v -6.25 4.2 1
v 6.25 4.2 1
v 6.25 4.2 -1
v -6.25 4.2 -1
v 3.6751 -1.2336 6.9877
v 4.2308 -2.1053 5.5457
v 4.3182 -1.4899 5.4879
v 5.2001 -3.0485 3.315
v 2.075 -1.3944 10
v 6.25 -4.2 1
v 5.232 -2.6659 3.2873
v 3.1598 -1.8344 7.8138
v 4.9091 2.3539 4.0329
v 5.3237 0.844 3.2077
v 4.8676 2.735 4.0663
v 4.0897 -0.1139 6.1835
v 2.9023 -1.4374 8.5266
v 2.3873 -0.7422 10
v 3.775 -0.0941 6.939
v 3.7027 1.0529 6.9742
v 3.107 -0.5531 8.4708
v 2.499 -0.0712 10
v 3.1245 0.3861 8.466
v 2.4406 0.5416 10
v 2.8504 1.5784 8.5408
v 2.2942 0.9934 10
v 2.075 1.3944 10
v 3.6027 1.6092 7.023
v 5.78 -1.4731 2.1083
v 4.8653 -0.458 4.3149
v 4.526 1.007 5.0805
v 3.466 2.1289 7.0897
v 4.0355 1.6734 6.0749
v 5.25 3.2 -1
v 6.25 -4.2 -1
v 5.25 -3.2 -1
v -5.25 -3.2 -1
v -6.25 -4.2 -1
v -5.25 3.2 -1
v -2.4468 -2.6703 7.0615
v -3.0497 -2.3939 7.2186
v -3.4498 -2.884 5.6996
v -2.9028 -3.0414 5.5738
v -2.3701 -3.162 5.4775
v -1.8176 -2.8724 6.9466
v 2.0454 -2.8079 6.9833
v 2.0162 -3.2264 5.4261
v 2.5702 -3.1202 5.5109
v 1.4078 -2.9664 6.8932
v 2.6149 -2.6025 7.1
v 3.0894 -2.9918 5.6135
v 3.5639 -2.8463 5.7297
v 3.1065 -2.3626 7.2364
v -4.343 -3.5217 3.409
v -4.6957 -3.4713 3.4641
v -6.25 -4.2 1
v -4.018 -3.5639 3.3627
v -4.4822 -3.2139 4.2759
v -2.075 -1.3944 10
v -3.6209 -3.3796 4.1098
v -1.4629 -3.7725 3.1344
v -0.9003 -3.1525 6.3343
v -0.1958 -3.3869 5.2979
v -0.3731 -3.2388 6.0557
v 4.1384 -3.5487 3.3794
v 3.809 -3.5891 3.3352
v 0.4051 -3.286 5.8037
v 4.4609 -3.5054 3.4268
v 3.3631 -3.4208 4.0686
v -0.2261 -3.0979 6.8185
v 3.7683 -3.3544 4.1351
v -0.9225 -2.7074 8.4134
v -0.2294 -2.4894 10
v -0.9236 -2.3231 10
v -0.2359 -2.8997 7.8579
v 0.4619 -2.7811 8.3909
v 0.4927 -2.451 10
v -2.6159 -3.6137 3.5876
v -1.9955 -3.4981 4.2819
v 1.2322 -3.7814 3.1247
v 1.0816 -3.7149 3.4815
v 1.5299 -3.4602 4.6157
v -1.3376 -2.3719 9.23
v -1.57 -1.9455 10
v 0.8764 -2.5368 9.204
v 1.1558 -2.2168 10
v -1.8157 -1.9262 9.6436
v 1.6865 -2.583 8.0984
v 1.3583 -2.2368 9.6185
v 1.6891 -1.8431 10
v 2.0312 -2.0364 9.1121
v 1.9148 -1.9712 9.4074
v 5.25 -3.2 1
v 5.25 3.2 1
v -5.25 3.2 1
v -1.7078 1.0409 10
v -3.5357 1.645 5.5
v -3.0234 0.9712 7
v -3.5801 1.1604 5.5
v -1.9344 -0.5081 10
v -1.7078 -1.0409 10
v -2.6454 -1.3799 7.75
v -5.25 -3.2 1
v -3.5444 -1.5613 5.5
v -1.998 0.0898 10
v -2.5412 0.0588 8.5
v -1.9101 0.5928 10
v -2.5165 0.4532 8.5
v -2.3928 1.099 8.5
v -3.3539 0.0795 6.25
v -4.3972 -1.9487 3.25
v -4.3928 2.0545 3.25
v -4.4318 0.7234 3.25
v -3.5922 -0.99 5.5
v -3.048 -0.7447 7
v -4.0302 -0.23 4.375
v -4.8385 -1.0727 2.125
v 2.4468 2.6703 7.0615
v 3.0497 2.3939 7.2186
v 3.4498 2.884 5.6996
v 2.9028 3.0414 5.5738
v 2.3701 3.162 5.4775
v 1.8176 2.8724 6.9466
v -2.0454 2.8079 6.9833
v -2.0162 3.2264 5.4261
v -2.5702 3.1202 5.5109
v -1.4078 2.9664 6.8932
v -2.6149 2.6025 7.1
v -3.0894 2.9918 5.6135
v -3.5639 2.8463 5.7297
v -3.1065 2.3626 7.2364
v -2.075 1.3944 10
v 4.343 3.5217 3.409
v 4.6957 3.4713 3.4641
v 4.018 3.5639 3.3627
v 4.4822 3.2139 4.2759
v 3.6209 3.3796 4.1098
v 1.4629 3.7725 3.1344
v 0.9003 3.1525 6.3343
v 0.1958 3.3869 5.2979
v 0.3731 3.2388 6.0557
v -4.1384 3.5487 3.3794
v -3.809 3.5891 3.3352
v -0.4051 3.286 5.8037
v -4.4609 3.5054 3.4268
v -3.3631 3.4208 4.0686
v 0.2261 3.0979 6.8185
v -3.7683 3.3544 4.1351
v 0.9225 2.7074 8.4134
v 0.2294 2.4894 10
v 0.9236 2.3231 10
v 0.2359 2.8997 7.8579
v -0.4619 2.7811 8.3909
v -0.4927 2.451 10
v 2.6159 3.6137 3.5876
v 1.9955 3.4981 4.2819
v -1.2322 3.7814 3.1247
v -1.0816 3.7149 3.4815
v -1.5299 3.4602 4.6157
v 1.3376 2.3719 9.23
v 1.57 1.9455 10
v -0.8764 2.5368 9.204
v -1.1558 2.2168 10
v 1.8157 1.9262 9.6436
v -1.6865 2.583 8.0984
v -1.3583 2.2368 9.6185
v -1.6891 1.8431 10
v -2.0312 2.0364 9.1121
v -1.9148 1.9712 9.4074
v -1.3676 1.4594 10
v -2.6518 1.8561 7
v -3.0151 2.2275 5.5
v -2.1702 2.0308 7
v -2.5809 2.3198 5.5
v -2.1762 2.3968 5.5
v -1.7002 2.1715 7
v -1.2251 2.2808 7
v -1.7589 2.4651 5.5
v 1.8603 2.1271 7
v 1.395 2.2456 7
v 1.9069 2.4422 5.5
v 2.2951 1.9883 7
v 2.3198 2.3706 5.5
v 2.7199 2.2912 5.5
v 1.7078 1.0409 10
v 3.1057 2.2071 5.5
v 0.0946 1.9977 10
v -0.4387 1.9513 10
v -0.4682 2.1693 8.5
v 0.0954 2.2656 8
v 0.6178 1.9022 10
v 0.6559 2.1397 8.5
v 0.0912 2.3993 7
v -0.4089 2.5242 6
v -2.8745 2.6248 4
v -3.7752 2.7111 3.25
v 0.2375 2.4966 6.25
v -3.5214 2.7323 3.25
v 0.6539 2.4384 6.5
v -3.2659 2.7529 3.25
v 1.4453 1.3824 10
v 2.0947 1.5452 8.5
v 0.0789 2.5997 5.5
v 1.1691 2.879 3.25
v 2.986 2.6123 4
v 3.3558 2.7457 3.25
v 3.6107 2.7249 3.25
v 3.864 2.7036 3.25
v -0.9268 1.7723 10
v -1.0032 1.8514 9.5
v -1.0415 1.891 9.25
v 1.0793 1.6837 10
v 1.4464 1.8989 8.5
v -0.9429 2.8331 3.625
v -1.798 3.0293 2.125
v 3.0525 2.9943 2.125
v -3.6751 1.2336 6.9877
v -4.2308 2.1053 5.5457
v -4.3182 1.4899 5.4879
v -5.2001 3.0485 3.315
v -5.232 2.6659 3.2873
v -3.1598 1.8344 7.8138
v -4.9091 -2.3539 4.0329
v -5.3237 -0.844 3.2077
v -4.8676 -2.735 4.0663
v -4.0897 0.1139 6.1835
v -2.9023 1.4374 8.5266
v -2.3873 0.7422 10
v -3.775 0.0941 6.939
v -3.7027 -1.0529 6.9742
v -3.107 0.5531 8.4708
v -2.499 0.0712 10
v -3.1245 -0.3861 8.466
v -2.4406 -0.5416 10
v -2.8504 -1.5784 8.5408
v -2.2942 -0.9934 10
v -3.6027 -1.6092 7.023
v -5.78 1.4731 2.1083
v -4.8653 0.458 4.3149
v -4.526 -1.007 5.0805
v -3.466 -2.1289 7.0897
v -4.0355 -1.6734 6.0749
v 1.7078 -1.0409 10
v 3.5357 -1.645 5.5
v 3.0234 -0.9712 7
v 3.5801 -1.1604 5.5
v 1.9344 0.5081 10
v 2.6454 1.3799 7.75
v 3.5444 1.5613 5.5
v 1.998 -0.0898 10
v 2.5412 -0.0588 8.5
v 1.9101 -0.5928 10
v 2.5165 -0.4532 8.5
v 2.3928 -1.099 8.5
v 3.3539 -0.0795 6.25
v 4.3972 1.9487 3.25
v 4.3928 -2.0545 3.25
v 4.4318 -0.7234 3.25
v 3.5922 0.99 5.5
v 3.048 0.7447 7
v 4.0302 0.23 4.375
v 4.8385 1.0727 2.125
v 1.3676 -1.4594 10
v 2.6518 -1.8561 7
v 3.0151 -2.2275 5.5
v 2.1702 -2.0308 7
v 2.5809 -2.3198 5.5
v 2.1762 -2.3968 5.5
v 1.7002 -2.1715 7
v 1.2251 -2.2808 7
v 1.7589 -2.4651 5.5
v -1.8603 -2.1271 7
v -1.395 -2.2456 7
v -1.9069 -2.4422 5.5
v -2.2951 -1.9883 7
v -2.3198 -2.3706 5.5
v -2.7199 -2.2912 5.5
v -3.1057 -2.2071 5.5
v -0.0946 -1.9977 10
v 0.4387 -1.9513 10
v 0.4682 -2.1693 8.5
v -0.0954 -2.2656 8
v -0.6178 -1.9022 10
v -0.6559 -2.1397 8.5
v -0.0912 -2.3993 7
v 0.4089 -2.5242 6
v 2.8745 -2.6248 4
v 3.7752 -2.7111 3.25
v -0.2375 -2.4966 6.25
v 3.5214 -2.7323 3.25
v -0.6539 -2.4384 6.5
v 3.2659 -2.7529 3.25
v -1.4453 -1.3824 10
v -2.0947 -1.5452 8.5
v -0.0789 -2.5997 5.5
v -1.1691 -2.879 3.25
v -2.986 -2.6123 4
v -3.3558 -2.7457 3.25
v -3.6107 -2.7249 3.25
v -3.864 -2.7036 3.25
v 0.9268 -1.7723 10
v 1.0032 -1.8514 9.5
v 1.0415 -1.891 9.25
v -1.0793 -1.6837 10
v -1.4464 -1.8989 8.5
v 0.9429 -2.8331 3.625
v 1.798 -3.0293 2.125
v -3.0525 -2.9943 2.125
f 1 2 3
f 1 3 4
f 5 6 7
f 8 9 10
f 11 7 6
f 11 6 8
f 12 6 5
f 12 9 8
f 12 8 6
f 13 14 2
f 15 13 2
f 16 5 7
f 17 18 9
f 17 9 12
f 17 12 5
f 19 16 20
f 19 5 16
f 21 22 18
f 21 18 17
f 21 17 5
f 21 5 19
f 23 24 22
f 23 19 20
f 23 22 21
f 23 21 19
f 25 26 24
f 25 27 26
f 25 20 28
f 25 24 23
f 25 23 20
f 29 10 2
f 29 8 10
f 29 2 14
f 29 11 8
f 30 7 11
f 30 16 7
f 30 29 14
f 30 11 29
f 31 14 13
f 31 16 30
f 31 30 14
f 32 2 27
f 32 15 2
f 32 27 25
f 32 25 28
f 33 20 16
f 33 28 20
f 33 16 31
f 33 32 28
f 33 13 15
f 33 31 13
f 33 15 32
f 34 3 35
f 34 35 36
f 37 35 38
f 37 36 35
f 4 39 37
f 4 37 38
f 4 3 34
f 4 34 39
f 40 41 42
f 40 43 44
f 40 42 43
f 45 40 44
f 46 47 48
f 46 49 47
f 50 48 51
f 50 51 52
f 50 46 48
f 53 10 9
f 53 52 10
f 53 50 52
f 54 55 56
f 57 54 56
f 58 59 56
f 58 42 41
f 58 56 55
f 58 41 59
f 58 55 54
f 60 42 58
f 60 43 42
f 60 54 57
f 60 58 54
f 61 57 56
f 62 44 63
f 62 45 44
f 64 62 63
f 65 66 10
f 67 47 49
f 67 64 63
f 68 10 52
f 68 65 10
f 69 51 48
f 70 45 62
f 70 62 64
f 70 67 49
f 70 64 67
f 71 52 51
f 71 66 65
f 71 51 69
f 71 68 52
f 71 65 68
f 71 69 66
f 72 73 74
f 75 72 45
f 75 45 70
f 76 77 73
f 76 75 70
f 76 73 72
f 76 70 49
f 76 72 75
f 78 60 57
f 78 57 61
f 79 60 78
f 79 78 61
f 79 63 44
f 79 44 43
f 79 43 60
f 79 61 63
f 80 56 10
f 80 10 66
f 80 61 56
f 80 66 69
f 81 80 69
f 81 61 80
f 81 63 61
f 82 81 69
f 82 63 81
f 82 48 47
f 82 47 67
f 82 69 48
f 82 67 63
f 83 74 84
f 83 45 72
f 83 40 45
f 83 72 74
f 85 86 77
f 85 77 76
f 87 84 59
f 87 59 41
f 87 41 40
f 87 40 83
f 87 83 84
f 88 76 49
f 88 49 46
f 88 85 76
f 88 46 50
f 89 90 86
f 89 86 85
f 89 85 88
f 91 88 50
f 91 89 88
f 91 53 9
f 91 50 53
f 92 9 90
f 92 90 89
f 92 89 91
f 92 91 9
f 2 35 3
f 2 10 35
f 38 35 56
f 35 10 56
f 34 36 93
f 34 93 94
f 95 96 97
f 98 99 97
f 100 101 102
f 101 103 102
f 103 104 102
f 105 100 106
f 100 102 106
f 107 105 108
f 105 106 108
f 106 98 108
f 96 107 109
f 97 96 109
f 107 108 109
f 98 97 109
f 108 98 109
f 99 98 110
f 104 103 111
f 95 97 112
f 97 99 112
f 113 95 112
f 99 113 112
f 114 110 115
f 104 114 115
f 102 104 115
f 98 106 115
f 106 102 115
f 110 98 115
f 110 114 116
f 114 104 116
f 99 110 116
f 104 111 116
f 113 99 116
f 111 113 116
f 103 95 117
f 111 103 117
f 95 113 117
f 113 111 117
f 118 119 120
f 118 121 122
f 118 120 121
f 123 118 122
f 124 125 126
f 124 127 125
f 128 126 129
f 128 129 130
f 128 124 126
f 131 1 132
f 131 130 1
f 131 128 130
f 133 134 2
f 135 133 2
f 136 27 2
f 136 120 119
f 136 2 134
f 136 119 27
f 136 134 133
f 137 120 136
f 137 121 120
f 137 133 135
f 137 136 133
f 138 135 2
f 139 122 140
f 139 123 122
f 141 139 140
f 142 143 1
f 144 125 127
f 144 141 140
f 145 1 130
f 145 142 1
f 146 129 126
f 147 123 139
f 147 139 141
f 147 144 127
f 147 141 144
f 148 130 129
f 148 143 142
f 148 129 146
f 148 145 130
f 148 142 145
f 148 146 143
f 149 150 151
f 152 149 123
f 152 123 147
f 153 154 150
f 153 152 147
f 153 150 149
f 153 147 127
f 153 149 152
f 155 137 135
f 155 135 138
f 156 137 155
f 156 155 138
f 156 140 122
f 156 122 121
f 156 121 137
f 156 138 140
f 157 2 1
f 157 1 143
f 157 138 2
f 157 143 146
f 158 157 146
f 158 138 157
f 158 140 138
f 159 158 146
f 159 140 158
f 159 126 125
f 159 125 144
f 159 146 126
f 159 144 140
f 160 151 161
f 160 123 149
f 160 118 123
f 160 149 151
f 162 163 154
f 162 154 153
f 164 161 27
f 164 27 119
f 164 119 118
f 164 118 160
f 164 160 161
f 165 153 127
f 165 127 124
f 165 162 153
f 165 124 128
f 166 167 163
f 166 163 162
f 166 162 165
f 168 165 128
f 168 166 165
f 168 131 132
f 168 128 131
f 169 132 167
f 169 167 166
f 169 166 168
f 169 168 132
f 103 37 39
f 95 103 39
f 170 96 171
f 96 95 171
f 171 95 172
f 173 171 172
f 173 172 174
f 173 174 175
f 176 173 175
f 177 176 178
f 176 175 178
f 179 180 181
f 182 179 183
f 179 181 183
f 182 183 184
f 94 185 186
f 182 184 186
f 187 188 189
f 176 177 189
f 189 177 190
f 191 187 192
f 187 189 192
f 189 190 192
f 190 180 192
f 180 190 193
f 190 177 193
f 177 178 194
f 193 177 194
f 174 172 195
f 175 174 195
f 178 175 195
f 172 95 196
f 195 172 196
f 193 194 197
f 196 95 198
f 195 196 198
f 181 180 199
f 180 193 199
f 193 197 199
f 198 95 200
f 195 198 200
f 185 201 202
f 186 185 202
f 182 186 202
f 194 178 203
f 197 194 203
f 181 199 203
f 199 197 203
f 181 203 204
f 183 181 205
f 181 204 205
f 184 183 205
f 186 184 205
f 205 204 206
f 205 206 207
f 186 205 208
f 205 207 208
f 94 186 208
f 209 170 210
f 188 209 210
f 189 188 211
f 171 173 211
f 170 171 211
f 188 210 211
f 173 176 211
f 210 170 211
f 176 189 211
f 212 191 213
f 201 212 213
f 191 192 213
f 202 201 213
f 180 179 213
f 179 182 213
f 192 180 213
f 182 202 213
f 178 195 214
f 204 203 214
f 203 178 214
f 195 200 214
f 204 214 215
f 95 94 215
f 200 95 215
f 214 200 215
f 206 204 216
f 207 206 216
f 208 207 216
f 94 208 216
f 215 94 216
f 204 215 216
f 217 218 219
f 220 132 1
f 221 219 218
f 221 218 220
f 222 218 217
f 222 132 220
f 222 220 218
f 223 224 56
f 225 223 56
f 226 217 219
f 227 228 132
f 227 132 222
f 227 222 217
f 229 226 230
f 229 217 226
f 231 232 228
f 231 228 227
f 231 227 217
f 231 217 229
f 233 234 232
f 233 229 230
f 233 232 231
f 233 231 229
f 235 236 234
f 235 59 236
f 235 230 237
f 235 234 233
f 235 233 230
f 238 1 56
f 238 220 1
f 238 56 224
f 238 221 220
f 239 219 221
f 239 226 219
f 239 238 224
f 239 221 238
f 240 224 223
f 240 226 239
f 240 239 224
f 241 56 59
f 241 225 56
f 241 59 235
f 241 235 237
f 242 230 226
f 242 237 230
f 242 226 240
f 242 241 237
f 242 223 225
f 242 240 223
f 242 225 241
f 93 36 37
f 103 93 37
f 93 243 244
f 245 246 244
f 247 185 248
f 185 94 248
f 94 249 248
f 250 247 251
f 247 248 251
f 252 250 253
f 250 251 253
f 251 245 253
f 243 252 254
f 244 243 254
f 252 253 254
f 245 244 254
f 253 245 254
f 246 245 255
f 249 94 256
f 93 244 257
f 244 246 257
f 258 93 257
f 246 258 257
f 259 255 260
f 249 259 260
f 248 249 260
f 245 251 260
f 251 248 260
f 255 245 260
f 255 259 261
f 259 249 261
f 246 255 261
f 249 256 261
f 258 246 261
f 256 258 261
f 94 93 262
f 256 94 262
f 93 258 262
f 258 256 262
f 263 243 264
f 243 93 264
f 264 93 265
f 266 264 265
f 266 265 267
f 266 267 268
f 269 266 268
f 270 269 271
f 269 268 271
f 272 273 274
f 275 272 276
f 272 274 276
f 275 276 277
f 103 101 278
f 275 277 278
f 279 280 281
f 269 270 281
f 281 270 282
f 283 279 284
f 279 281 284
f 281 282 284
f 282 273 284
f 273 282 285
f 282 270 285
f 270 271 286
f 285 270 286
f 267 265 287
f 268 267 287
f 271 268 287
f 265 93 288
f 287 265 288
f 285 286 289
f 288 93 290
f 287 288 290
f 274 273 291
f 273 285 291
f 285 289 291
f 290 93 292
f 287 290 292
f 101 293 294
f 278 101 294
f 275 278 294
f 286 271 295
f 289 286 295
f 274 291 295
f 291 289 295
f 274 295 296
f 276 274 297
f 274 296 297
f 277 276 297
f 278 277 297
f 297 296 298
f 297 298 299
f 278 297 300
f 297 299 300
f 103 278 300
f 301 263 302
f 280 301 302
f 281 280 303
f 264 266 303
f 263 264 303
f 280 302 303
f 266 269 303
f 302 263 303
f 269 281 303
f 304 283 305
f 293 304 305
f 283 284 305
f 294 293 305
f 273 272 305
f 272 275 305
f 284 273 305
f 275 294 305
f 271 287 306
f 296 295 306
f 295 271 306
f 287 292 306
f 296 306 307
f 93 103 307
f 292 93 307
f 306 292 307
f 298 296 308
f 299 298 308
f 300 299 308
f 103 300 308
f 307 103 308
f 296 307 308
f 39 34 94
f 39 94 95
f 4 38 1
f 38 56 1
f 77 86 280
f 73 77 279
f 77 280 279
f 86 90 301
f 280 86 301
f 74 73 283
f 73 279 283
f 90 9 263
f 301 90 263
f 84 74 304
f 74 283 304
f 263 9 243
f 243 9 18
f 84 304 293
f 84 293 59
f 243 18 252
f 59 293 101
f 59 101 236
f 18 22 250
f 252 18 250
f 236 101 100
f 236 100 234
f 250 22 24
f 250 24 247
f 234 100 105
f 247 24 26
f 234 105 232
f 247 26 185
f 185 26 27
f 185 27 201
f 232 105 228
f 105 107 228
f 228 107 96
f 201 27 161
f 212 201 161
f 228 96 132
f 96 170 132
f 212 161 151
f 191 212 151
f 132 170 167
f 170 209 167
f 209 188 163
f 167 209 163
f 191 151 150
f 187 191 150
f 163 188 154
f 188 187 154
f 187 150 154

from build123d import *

# Parameters (mm, degrees)
SKETCH1_W           = 12.5
SKETCH1_H           = 8.4
SKETCH1_W_2         = 10.5
SKETCH1_H_2         = 6.4
BOSS_EXTRUDE1_DEPTH = 1
SKETCH6_W           = 12.5
SKETCH6_H           = 8.4
BOSS_EXTRUDE2_DEPTH = 1
SKETCH7_W           = 10.5
SKETCH7_H           = 6.4
CUT_EXTRUDE1_DEPTH  = 1


with BuildPart() as part:
    # Sketch1 → Boss-Extrude1 (new body)
    with BuildSketch(Plane.XY):
        Rectangle(SKETCH1_W, SKETCH1_H)
        Rectangle(SKETCH1_W_2, SKETCH1_H_2, mode=Mode.SUBTRACT)
    extrude(amount=BOSS_EXTRUDE1_DEPTH)

    # Sketch3 → Loft1 section 0
    with BuildSketch(Plane.XY.offset(1)):
        with BuildLine():
            Line((6.25, -4.2), (6.25, 4.2))
            Line((6.25, 4.2), (-6.25, 4.2))
            Line((-6.25, 4.2), (-6.25, -4.2))
            Line((-6.25, -4.2), (6.25, -4.2))
        make_face()
    # Sketch2 for Loft1 → Loft1 section 1
    with BuildSketch(Plane.XY.offset(10)):
        with BuildLine():
            # circular arc as an exact rational Bezier (weights 1, cos(half-angle), 1)
            Bezier((2.075003924, -1.394402637), (3.012042497, 0), (2.075003924, 1.394402637), weights=[1, 0.830001569, 1])
            Bezier((2.075003924, 1.394402637), (0, 4.482206096), (-2.075003924, 1.394402637), weights=[1, 0.557761055, 1])
            Bezier((-2.075003924, 1.394402637), (-3.012042497, 0), (-2.075003924, -1.394402637), weights=[1, 0.830001569, 1])
            Bezier((-2.075003924, -1.394402637), (0, -4.482206096), (2.075003924, -1.394402637), weights=[1, 0.557761055, 1])
        make_face()
    loft()

    # Cut-Loft1: read off the stored shape, not the designer's step
    # Cut-Loft1: loft between two sections, ruled curve by curve
    cut_loft1_from = [
        Edge.make_bspline([(1.707768655, -1.040925656, 10), (1.633699479, -1.162445397, 10), (1.542008876, -1.28354475, 10), (1.31984949, -1.511051231, 10), (1.189256111, -1.617336715, 10), (0.892947872, -1.797985608, 10), (0.72722112, -1.87212471, 10), (0.374256765, -1.973229171, 10), (0.187198335, -2, 10), (-0.187198335, -2, 10), (-0.374256765, -1.973229171, 10), (-0.72722112, -1.87212471, 10), (-0.892947872, -1.797985608, 10), (-1.189256111, -1.617336715, 10), (-1.31984949, -1.511051231, 10), (-1.542008876, -1.28354475, 10), (-1.633699479, -1.162445397, 10), (-1.707768655, -1.040925656, 10)], [0, 0, 0, 0, 0.125, 0.125, 0.25, 0.25, 0.375, 0.375, 0.5, 0.5, 0.625, 0.625, 0.75, 0.75, 0.875, 0.875, 1, 1, 1, 1], 3),
        Edge.make_bspline([(-1.707768655, -1.040925656, 10), (-1.798062507, -0.892787306, 10), (-1.872174068, -0.727085204, 10), (-1.973239973, -0.374182636, 10), (-2, -0.187161202, 10), (-2, 0.187161202, 10), (-1.973239973, 0.374182636, 10), (-1.872174068, 0.727085204, 10), (-1.798062507, 0.892787306, 10), (-1.707768655, 1.040925656, 10)], [0, 0, 0, 0, 0.25, 0.25, 0.5, 0.5, 0.75, 0.75, 1, 1, 1, 1], 3),
        Edge.make_bspline([(1.707768655, 1.040925656, 10), (1.798062507, 0.892787306, 10), (1.872174068, 0.727085204, 10), (1.973239973, 0.374182636, 10), (2, 0.187161202, 10), (2, -0.187161202, 10), (1.973239973, -0.374182636, 10), (1.872174068, -0.727085204, 10), (1.798062507, -0.892787306, 10), (1.707768655, -1.040925656, 10)], [0, 0, 0, 0, 0.25, 0.25, 0.5, 0.5, 0.75, 0.75, 1, 1, 1, 1], 3),
        Edge.make_bspline([(-1.707768655, 1.040925656, 10), (-1.633699479, 1.162445397, 10), (-1.542008876, 1.28354475, 10), (-1.31984949, 1.511051231, 10), (-1.189256111, 1.617336715, 10), (-0.892947872, 1.797985608, 10), (-0.72722112, 1.87212471, 10), (-0.374256765, 1.973229171, 10), (-0.187198335, 2, 10), (0.187198335, 2, 10), (0.374256765, 1.973229171, 10), (0.72722112, 1.87212471, 10), (0.892947872, 1.797985608, 10), (1.189256111, 1.617336715, 10), (1.31984949, 1.511051231, 10), (1.542008876, 1.28354475, 10), (1.633699479, 1.162445397, 10), (1.707768655, 1.040925656, 10)], [0, 0, 0, 0, 0.125, 0.125, 0.25, 0.25, 0.375, 0.375, 0.5, 0.5, 0.625, 0.625, 0.75, 0.75, 0.875, 0.875, 1, 1, 1, 1], 3),
    ]
    cut_loft1_to = [
        Edge.make_bspline([(5.25, -3.2, 1), (4.8125, -3.2, 1), (4.375, -3.2, 1), (3.5, -3.2, 1), (3.0625, -3.2, 1), (2.1875, -3.2, 1), (1.75, -3.2, 1), (0.875, -3.2, 1), (0.4375, -3.2, 1), (-0.4375, -3.2, 1), (-0.875, -3.2, 1), (-1.75, -3.2, 1), (-2.1875, -3.2, 1), (-3.0625, -3.2, 1), (-3.5, -3.2, 1), (-4.375, -3.2, 1), (-4.8125, -3.2, 1), (-5.25, -3.2, 1)], [0, 0, 0, 0, 0.125, 0.125, 0.25, 0.25, 0.375, 0.375, 0.5, 0.5, 0.625, 0.625, 0.75, 0.75, 0.875, 0.875, 1, 1, 1, 1], 3),
        Edge.make_bspline([(-5.25, -3.2, 1), (-5.25, -2.666666667, 1), (-5.25, -2.133333333, 1), (-5.25, -1.066666667, 1), (-5.25, -0.533333333, 1), (-5.25, 0.533333333, 1), (-5.25, 1.066666667, 1), (-5.25, 2.133333333, 1), (-5.25, 2.666666667, 1), (-5.25, 3.2, 1)], [0, 0, 0, 0, 0.25, 0.25, 0.5, 0.5, 0.75, 0.75, 1, 1, 1, 1], 3),
        Edge.make_bspline([(5.25, 3.2, 1), (5.25, 2.666666667, 1), (5.25, 2.133333333, 1), (5.25, 1.066666667, 1), (5.25, 0.533333333, 1), (5.25, -0.533333333, 1), (5.25, -1.066666667, 1), (5.25, -2.133333333, 1), (5.25, -2.666666667, 1), (5.25, -3.2, 1)], [0, 0, 0, 0, 0.25, 0.25, 0.5, 0.5, 0.75, 0.75, 1, 1, 1, 1], 3),
        Edge.make_bspline([(-5.25, 3.2, 1), (-4.8125, 3.2, 1), (-4.375, 3.2, 1), (-3.5, 3.2, 1), (-3.0625, 3.2, 1), (-2.1875, 3.2, 1), (-1.75, 3.2, 1), (-0.875, 3.2, 1), (-0.4375, 3.2, 1), (0.4375, 3.2, 1), (0.875, 3.2, 1), (1.75, 3.2, 1), (2.1875, 3.2, 1), (3.0625, 3.2, 1), (3.5, 3.2, 1), (4.375, 3.2, 1), (4.8125, 3.2, 1), (5.25, 3.2, 1)], [0, 0, 0, 0, 0.125, 0.125, 0.25, 0.25, 0.375, 0.375, 0.5, 0.5, 0.625, 0.625, 0.75, 0.75, 0.875, 0.875, 1, 1, 1, 1], 3),
    ]
    cut_loft1 = Solid(Shell([*[Face.make_surface_from_curves(cut_loft1_from[k], cut_loft1_to[k]) for k in range(4)], Face(Wire(cut_loft1_from)), Face(Wire(cut_loft1_to))]))
    add(cut_loft1, mode=Mode.SUBTRACT)

    # Sketch6 → Boss-Extrude2 (add)
    with BuildSketch(Plane(origin=(0, 0, 0), x_dir=(-1, 0, 0), z_dir=(0, 0, -1))):
        Rectangle(SKETCH6_W, SKETCH6_H)
    extrude(amount=BOSS_EXTRUDE2_DEPTH)

    # Sketch7 → Cut-Extrude1 (cut)
    with BuildSketch(Plane(origin=(0, 0, -1), x_dir=(-1, 0, 0), z_dir=(0, 0, -1))):
        Rectangle(SKETCH7_W, SKETCH7_H)
    extrude(amount=-CUT_EXTRUDE1_DEPTH, mode=Mode.SUBTRACT)


solid = part.part
